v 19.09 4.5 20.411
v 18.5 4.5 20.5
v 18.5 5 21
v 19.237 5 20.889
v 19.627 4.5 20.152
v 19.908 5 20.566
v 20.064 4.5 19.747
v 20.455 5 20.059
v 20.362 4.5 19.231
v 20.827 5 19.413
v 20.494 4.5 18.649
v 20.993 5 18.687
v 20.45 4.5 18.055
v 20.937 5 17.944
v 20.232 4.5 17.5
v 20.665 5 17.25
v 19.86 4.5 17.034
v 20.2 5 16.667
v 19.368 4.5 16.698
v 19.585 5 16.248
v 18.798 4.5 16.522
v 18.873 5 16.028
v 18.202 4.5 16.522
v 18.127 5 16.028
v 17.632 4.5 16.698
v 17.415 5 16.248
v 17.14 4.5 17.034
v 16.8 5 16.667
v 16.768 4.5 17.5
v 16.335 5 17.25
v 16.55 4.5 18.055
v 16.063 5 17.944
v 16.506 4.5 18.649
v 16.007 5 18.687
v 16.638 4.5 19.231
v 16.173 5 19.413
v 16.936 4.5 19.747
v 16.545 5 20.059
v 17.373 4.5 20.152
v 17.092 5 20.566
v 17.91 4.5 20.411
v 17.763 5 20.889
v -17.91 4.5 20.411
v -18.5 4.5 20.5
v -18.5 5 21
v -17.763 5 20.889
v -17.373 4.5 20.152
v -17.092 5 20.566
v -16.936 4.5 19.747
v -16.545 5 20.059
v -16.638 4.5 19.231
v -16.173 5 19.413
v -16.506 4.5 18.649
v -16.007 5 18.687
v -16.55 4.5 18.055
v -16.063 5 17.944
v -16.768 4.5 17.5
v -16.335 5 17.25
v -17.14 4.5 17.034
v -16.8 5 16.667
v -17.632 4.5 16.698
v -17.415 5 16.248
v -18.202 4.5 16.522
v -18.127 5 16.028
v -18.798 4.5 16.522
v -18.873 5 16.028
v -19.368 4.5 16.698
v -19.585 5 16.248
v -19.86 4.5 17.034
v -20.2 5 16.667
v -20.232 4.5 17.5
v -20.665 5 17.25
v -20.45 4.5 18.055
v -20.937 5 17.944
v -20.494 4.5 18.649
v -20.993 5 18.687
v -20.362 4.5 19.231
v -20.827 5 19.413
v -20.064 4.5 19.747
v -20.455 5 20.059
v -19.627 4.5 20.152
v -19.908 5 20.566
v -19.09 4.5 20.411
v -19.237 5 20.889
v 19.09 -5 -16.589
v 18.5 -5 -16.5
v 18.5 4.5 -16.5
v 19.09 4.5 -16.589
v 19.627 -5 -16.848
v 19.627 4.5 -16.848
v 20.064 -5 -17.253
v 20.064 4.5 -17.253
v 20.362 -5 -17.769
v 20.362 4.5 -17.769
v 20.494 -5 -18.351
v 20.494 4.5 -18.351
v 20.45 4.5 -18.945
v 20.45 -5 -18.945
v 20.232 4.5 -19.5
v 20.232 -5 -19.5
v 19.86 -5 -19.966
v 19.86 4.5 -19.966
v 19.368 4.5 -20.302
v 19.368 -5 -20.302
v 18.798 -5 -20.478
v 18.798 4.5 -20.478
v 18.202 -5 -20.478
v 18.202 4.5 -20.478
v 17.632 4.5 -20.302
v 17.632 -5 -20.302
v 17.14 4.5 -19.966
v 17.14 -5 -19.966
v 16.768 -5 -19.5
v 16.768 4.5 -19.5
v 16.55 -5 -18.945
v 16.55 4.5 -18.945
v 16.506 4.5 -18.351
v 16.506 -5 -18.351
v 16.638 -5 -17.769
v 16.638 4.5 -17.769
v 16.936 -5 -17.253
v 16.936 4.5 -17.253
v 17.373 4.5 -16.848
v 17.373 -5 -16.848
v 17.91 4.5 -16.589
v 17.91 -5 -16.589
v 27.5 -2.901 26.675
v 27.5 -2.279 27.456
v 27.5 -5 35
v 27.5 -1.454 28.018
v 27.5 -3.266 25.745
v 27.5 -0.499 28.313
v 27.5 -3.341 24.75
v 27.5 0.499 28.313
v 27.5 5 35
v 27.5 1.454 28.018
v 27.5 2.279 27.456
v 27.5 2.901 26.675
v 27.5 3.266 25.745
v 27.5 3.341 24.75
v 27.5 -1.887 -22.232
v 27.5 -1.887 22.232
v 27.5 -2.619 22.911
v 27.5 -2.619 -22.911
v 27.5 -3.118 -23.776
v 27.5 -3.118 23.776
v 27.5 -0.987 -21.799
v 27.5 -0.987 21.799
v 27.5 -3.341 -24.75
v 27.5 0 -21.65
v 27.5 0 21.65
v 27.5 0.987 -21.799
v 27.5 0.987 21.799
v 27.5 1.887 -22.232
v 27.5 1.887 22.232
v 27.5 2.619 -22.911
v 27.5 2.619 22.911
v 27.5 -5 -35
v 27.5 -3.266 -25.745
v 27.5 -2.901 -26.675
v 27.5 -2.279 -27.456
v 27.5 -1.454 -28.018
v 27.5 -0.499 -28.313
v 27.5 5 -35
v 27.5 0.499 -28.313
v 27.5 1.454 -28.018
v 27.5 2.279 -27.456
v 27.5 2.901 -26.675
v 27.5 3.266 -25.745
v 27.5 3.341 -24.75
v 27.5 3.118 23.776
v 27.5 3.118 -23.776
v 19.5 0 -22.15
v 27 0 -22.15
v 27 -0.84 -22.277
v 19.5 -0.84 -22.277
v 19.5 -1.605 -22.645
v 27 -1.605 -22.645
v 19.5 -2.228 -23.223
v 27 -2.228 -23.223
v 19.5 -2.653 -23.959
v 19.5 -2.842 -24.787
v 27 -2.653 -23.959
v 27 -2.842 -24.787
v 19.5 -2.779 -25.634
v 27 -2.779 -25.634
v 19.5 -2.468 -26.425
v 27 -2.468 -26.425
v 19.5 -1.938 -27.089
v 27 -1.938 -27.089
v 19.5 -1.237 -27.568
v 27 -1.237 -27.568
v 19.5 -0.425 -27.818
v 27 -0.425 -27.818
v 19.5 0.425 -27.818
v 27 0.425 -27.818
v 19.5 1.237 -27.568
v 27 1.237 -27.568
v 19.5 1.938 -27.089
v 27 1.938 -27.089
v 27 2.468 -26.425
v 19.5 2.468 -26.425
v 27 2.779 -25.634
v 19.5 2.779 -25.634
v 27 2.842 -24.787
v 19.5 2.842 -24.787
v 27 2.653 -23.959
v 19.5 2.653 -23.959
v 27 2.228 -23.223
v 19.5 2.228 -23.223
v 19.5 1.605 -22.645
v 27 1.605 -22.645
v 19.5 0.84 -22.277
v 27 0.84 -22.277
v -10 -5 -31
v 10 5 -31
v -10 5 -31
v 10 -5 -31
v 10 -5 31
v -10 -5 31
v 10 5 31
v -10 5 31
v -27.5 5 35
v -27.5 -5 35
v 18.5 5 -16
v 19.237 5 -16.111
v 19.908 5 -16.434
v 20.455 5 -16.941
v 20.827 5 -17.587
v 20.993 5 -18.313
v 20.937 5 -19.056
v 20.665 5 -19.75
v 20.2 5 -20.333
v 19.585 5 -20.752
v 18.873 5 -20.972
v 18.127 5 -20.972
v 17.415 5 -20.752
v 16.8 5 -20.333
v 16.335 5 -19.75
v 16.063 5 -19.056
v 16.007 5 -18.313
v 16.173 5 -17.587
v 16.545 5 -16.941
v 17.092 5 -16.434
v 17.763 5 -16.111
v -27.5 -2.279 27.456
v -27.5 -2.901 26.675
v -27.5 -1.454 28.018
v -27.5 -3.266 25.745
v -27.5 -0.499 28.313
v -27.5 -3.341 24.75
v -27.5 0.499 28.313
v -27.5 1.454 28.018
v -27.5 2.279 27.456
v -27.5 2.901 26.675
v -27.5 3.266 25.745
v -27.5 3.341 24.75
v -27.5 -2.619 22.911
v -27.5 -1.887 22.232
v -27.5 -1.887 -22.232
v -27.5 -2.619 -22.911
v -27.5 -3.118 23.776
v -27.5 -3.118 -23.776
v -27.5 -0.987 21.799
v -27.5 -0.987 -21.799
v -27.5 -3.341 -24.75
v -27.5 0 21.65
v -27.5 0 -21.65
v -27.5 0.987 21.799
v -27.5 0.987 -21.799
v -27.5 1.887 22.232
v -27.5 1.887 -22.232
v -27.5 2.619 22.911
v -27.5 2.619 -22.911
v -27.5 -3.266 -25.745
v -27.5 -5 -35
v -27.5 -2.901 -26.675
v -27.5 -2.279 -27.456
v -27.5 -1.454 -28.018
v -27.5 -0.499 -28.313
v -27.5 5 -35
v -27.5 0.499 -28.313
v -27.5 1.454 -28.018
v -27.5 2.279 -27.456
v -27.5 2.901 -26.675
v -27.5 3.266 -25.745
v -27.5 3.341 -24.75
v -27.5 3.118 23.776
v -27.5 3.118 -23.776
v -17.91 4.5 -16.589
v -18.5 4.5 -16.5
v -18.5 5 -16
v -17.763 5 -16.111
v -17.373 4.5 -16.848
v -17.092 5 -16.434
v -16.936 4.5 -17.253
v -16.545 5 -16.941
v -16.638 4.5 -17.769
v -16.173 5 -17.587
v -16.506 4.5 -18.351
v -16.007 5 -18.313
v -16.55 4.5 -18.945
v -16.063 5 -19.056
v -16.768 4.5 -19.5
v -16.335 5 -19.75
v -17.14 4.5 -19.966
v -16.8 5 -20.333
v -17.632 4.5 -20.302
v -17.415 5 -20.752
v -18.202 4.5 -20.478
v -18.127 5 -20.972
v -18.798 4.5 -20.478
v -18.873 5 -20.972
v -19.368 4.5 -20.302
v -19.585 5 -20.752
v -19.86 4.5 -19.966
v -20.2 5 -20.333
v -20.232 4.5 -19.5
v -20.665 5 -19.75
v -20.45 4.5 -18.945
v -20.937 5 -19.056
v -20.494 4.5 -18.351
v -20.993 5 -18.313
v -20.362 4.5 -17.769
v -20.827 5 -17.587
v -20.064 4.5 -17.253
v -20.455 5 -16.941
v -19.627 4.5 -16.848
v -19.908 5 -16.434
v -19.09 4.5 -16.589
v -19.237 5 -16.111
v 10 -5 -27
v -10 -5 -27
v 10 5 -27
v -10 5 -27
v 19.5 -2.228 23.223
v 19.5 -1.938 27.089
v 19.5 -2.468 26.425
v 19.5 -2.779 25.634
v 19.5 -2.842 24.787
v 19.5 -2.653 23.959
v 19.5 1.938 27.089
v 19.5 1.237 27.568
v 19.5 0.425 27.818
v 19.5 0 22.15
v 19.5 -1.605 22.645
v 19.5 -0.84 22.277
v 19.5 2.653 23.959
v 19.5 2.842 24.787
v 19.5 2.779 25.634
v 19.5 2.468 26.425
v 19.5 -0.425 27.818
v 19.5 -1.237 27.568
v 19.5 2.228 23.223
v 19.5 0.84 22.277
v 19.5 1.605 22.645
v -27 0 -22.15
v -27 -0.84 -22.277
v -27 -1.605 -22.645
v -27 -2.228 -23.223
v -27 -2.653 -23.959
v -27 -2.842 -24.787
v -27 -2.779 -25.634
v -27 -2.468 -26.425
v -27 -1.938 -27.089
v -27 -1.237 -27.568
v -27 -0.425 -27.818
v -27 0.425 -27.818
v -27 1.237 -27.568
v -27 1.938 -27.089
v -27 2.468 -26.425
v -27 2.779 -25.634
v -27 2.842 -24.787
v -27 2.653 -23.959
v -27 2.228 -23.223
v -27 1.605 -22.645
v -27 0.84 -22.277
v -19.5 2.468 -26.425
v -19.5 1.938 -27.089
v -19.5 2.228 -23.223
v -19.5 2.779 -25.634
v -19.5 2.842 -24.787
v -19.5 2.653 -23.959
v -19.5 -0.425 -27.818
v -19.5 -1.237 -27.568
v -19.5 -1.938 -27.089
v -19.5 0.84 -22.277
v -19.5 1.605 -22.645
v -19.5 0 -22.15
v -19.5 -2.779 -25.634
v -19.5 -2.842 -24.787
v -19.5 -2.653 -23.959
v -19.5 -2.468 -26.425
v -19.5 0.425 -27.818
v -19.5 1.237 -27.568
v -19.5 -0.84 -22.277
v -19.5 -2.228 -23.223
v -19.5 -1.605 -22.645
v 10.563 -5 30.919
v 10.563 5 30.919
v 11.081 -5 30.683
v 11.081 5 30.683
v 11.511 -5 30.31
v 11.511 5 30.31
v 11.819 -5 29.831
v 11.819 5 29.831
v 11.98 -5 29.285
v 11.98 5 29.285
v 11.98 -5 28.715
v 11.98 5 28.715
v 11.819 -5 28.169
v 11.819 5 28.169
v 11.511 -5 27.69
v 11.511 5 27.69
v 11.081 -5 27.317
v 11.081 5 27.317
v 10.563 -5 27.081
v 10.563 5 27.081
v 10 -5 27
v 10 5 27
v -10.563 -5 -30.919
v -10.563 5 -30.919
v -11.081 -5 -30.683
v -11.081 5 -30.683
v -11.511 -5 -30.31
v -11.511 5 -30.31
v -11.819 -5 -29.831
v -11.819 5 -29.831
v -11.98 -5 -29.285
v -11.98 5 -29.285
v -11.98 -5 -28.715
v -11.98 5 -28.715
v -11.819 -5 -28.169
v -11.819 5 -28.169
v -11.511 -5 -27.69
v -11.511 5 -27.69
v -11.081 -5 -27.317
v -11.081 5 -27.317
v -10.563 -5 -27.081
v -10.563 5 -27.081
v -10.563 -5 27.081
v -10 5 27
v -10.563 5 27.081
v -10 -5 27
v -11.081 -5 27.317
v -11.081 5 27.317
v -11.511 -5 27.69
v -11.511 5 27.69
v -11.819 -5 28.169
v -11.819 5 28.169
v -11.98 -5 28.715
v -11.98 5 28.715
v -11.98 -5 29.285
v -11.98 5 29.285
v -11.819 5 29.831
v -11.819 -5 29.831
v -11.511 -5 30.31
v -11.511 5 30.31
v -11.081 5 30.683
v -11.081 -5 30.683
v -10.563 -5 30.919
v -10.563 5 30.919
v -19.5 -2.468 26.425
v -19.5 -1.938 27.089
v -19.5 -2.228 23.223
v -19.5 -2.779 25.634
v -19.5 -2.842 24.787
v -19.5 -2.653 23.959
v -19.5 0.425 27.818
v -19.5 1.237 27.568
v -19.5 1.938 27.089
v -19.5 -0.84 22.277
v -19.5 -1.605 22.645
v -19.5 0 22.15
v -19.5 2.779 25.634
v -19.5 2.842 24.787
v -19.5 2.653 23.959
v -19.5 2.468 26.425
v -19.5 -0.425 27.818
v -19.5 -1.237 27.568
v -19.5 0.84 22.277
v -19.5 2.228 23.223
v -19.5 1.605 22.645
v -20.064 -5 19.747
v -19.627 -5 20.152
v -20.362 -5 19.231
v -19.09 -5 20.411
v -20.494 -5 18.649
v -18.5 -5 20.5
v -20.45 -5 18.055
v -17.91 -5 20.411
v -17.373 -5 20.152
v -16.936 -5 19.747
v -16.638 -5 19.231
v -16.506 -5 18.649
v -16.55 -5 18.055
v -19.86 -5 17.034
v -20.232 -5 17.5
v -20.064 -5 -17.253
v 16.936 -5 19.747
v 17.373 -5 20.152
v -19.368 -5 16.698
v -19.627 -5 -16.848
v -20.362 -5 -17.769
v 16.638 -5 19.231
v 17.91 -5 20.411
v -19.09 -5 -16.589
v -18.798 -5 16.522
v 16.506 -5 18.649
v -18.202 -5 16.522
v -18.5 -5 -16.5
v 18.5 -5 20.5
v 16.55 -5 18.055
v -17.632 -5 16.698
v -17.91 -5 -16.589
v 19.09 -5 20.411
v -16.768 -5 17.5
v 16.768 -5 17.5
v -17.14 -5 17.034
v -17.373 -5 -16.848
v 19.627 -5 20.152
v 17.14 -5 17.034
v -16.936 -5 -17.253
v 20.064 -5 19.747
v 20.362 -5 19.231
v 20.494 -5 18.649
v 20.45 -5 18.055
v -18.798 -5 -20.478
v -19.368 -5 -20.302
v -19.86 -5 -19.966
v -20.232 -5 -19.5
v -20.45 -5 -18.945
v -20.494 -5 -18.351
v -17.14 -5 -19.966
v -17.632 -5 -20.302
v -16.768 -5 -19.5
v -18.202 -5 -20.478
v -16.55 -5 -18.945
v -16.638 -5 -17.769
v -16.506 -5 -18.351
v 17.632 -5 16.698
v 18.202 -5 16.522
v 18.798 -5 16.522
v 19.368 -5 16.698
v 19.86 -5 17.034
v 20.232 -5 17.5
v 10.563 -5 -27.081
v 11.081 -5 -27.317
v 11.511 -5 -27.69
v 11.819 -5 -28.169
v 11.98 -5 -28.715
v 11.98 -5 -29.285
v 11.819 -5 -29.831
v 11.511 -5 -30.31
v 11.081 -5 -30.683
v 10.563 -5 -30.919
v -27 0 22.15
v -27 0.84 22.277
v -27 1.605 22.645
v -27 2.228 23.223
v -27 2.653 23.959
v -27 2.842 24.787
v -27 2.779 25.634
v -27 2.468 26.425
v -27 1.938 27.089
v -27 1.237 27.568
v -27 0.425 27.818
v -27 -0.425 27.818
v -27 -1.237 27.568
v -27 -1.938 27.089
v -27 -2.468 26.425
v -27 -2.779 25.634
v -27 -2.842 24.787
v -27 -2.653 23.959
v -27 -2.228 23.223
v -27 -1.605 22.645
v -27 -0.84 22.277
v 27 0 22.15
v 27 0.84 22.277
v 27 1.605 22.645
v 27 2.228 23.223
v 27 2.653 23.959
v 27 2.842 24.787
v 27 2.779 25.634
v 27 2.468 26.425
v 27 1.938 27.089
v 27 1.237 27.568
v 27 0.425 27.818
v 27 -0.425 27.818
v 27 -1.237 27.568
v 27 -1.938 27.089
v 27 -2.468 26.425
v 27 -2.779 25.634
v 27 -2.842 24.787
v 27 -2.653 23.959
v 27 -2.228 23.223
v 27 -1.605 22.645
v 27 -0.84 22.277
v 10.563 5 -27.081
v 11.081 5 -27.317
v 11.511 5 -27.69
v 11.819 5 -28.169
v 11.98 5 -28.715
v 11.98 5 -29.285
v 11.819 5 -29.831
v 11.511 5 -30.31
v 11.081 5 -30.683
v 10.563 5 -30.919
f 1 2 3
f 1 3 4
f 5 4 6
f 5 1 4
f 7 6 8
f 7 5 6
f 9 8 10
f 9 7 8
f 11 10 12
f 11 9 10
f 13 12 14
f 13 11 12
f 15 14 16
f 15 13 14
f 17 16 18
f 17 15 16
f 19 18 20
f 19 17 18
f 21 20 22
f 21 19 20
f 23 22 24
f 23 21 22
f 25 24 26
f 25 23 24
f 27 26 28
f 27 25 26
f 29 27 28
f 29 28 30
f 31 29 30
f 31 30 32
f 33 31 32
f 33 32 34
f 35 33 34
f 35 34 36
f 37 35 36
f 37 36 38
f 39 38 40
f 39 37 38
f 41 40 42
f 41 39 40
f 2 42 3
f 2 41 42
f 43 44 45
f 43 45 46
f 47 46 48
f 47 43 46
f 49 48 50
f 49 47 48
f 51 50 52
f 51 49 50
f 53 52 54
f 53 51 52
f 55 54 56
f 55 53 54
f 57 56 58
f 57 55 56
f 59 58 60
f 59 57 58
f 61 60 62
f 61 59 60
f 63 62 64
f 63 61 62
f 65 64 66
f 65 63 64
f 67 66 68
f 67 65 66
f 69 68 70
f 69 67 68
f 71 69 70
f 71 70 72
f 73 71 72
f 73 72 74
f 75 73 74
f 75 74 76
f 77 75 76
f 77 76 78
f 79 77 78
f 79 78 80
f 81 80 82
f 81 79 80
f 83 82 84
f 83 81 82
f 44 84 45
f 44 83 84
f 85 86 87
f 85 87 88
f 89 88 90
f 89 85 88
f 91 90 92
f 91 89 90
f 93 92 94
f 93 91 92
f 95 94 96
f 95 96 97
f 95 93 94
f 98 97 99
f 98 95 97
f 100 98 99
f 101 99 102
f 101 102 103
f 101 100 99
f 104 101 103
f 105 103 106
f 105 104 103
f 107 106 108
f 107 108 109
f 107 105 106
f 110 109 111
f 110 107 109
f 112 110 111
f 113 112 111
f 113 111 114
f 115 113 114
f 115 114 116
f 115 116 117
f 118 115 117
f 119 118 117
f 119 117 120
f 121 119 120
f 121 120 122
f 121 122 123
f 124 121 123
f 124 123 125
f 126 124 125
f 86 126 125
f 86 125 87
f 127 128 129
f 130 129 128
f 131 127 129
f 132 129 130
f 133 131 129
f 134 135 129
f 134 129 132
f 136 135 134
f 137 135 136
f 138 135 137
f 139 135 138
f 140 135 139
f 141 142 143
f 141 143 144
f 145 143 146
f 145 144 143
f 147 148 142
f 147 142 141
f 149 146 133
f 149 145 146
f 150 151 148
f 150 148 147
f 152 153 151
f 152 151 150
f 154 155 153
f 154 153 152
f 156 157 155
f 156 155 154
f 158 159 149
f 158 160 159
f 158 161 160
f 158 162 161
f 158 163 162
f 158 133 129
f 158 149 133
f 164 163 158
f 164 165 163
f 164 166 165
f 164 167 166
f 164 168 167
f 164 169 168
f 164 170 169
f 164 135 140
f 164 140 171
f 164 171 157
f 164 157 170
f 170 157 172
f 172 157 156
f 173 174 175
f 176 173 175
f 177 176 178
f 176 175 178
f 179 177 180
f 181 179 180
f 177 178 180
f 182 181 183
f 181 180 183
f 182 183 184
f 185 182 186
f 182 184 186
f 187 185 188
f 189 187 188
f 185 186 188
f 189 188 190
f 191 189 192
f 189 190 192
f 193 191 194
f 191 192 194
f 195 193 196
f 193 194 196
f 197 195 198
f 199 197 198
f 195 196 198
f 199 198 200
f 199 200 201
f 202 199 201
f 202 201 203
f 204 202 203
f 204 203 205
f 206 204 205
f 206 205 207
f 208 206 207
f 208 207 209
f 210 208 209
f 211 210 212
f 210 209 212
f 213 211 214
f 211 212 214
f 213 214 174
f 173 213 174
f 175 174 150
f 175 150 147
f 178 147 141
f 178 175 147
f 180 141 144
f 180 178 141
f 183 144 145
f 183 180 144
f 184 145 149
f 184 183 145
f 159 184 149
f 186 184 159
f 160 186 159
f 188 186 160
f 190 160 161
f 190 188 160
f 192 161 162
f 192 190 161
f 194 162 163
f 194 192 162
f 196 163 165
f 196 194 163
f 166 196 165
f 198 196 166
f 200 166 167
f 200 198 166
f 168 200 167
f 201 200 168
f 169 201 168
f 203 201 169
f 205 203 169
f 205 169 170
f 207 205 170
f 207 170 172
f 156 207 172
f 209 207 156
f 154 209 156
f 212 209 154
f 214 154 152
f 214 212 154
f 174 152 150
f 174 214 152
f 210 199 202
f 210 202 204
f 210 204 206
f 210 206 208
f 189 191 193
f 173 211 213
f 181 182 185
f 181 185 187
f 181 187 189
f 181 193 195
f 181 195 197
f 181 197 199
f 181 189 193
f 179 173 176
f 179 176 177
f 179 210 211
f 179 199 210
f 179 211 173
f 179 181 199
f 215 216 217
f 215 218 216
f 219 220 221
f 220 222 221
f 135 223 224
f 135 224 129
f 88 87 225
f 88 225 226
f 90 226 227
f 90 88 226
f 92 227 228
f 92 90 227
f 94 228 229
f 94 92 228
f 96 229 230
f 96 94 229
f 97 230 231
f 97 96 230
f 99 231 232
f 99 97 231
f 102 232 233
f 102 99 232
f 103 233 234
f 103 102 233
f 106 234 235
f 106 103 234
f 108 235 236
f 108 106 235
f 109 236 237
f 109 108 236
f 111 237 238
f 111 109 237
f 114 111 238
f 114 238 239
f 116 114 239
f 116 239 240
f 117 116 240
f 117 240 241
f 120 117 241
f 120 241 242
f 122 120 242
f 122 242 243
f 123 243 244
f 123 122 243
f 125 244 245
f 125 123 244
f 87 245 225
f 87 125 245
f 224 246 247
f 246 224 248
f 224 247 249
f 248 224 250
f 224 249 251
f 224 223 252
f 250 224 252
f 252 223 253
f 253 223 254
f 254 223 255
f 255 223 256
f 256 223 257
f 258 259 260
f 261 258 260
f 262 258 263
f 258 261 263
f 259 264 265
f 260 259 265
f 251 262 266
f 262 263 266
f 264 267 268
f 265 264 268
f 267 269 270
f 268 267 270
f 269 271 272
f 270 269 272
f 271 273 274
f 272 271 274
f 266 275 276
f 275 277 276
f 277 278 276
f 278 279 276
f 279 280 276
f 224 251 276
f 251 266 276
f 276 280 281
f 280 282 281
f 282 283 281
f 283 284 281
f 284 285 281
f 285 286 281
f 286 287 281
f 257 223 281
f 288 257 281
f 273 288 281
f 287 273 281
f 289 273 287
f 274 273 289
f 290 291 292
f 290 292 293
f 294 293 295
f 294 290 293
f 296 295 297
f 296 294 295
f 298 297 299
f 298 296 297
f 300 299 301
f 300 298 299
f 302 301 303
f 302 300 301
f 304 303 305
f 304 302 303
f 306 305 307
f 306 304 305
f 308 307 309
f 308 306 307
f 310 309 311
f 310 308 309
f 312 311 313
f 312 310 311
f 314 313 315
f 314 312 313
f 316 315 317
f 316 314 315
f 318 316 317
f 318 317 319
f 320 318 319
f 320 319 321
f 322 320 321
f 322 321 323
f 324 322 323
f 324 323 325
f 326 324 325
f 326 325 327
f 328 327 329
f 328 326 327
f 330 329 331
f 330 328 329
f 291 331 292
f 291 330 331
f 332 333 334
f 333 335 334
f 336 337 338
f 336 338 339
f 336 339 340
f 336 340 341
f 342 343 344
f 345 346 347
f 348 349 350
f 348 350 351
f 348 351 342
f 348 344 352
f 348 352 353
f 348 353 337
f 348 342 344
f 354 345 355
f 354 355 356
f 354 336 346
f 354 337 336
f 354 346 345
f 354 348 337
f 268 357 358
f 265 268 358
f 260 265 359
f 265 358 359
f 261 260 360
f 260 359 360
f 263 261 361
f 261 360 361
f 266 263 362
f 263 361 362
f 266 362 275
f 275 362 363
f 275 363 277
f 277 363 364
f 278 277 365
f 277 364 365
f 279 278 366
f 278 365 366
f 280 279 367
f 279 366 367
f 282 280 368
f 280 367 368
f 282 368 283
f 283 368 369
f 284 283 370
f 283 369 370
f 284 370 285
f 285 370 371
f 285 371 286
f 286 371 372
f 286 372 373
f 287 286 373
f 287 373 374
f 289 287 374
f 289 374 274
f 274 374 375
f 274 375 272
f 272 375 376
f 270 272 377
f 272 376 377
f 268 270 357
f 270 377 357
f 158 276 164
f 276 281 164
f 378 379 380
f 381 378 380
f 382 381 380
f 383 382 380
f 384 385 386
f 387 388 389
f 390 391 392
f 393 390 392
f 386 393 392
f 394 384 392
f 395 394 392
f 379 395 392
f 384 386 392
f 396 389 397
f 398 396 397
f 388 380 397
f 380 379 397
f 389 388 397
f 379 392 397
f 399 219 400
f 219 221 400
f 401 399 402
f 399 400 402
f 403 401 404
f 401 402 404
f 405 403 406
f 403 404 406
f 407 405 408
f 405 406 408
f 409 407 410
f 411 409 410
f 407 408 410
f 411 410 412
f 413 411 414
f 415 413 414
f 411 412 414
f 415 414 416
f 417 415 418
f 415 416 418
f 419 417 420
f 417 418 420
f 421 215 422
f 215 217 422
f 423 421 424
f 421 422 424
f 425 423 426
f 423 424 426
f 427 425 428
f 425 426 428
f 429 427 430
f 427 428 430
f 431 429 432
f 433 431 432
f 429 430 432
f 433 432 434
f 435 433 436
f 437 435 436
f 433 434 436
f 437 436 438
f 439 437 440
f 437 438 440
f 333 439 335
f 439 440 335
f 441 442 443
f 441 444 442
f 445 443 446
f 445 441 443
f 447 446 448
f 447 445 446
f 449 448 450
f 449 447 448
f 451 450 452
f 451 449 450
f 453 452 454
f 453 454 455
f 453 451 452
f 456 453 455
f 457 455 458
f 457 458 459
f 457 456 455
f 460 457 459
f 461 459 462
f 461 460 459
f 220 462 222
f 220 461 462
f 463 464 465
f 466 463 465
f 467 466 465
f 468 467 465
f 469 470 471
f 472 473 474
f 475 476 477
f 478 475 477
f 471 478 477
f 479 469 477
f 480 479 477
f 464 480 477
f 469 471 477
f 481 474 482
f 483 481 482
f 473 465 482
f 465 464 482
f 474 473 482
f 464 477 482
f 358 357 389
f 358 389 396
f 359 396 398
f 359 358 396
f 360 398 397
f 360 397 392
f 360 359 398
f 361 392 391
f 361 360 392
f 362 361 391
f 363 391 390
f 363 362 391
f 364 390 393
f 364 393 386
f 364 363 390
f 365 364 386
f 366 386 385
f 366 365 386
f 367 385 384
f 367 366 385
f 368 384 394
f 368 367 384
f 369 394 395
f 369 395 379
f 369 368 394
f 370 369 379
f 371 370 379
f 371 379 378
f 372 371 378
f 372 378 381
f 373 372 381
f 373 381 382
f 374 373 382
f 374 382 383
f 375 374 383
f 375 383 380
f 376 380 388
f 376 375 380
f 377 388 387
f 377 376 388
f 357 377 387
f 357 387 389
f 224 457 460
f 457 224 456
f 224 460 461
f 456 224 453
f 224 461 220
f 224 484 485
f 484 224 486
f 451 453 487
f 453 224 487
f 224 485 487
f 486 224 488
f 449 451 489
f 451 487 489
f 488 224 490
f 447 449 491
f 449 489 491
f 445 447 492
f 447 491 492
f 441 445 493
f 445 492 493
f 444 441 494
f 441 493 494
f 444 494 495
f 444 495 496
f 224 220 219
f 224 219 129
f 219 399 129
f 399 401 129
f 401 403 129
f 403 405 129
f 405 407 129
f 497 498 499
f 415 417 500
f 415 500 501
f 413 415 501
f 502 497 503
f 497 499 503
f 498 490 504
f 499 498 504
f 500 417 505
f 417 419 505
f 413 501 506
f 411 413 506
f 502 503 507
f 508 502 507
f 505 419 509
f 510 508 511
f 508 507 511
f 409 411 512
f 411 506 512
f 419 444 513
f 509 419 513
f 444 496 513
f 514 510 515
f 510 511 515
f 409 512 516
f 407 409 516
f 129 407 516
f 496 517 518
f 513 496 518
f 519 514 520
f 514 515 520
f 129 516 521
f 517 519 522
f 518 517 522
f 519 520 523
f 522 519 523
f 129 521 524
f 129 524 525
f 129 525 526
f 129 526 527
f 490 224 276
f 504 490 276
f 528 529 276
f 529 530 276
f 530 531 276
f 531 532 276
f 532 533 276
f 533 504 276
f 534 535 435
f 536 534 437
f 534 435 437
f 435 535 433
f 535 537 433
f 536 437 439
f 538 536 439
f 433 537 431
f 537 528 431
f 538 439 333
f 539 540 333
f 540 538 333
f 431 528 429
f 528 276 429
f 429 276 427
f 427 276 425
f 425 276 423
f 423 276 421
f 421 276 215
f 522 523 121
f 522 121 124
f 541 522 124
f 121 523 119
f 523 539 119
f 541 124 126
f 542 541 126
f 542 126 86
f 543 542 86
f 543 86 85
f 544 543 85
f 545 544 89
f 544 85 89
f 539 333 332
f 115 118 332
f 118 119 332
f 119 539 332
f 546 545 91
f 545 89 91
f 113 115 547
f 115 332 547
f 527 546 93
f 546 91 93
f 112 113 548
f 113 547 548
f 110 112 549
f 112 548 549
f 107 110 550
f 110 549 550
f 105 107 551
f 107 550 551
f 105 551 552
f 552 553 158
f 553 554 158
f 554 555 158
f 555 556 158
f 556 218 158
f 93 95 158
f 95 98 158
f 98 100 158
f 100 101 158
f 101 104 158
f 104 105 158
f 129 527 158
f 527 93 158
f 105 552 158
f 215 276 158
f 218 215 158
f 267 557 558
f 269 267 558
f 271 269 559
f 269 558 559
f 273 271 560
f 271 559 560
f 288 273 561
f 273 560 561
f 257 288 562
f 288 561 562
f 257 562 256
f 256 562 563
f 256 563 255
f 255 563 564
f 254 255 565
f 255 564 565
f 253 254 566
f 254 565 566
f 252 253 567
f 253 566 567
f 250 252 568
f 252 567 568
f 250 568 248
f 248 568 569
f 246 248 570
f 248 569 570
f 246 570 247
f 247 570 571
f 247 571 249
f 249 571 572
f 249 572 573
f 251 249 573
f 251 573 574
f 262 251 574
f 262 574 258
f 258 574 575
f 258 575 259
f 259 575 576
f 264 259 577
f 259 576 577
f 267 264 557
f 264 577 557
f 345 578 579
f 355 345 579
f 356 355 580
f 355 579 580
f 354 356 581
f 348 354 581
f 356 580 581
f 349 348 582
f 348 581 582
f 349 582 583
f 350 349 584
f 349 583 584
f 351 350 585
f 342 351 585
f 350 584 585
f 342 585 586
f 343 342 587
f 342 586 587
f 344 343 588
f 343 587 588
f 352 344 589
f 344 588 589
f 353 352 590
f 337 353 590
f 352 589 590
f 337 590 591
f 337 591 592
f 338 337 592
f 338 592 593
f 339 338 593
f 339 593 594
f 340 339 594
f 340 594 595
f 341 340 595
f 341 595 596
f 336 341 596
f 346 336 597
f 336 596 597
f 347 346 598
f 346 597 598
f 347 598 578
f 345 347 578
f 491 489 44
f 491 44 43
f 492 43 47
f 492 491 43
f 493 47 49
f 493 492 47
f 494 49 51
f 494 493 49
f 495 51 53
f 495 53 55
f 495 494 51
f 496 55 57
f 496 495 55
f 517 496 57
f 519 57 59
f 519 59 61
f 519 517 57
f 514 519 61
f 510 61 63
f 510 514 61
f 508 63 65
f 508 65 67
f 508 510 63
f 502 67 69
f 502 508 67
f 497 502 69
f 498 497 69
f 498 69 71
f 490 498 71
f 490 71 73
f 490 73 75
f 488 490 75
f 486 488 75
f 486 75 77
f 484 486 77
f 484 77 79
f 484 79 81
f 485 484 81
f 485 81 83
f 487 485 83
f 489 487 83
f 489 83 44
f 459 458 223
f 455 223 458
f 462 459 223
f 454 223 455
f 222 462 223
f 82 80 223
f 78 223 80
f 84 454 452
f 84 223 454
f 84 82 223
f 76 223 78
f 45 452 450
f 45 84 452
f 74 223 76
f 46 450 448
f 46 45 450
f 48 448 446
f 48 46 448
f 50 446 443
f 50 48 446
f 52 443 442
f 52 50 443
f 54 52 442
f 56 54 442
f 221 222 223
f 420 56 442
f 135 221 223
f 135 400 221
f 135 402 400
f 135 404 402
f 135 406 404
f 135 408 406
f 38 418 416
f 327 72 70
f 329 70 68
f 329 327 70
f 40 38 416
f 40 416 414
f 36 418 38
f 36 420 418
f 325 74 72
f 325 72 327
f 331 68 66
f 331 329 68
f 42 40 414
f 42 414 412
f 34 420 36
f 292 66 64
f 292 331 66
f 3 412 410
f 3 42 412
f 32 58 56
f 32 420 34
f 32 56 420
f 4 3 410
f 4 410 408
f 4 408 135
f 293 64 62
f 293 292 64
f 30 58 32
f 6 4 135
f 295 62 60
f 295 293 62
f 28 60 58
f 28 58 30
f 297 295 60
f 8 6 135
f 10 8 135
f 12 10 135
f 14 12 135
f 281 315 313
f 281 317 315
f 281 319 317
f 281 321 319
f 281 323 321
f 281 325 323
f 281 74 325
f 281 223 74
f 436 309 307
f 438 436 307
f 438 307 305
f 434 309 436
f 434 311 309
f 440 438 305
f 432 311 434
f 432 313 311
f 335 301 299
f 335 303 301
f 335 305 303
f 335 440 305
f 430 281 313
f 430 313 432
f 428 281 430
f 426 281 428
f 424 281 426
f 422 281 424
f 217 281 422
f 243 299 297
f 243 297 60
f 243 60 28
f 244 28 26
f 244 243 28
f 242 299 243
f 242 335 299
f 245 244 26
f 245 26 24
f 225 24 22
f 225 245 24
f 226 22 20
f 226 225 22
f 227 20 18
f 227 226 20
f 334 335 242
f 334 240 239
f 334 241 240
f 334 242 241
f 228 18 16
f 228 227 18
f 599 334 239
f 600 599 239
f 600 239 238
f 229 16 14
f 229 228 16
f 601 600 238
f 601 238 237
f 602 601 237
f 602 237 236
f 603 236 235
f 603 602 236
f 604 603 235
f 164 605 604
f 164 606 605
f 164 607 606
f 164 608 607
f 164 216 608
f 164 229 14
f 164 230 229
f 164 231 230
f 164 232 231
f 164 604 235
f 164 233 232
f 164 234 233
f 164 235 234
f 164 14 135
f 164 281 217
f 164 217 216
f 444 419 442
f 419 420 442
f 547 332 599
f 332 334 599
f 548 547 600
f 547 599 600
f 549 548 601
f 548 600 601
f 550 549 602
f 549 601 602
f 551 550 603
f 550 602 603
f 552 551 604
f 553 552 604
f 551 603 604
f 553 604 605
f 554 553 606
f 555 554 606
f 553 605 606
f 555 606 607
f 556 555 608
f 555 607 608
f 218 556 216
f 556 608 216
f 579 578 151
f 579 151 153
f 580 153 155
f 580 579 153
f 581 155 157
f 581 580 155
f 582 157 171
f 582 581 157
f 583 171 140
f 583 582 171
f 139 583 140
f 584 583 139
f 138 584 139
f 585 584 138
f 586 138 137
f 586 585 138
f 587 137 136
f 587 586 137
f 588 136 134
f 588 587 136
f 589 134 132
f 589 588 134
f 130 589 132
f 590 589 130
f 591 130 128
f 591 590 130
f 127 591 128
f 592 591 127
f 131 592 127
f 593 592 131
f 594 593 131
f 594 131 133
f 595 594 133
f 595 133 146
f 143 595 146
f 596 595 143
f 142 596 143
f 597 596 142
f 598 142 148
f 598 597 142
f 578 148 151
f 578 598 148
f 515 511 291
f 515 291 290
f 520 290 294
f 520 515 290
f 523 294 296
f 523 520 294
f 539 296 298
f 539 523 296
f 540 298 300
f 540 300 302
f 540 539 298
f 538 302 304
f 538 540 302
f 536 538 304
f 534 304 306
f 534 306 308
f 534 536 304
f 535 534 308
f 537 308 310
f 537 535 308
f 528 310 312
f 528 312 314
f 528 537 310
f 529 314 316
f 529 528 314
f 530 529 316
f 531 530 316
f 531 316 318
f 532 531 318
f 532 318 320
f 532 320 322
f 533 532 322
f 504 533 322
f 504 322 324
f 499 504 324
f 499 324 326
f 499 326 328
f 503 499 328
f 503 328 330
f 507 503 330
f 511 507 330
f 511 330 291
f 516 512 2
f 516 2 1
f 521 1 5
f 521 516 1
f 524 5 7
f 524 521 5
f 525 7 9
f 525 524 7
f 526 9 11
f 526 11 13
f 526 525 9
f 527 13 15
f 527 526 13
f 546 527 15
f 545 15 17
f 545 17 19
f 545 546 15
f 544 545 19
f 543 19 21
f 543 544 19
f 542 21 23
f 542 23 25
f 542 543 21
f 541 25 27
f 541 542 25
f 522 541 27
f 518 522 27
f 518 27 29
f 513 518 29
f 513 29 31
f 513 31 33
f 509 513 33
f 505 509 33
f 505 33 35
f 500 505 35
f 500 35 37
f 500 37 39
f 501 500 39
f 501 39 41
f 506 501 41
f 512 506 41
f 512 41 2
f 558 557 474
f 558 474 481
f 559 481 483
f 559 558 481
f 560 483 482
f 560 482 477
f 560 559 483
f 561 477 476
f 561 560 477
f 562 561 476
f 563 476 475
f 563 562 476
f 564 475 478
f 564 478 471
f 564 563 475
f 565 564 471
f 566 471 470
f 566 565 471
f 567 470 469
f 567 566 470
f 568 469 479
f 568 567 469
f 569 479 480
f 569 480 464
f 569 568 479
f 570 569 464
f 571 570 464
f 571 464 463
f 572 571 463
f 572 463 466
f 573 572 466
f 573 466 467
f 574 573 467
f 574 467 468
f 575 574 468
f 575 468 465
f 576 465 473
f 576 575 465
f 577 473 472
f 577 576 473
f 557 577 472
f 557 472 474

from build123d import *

# Parameters (mm, degrees)
SKETCH1_W           = 55
SKETCH1_H           = 70
SKETCH1_R           = 2
BOSS_EXTRUDE1_DEPTH = 5
SKETCH2_R           = 2.85
CUT_EXTRUDE1_DEPTH  = 8
CHAMFER1_SIZE       = 0.5


with BuildPart() as part:
    # Sketch1 → Boss-Extrude1 (new, symmetric)
    with BuildSketch(Plane(origin=(0, 0, 0), x_dir=(1, 0, 0), z_dir=(0, 1, 0))):
        Rectangle(SKETCH1_W, SKETCH1_H)
        with Locations(Location((18.5, -18.5, 0), (0, 0, 270))):
            Circle(SKETCH1_R, mode=Mode.SUBTRACT)
        with Locations(Location((-18.5, -18.5, 0), (0, 0, 270))):
            Circle(SKETCH1_R, mode=Mode.SUBTRACT)
        with Locations(Location((18.5, 18.5, 0), (0, 0, 270))):
            Circle(SKETCH1_R, mode=Mode.SUBTRACT)
        with Locations(Location((-18.5, 18.5, 0), (0, 0, 270))):
            Circle(SKETCH1_R, mode=Mode.SUBTRACT)
        with BuildLine():
            Line((-10, 27), (10, 27))
            ThreePointArc((10, 27), (12, 29), (10, 31))
            Line((10, 31), (-10, 31))
            ThreePointArc((-10, 31), (-12, 29), (-10, 27))
        make_face(mode=Mode.SUBTRACT)
        with BuildLine():
            Line((-10, -31), (10, -31))
            ThreePointArc((10, -31), (12, -29), (10, -27))
            Line((10, -27), (-10, -27))
            ThreePointArc((-10, -27), (-12, -29), (-10, -31))
        make_face(mode=Mode.SUBTRACT)
    extrude(amount=BOSS_EXTRUDE1_DEPTH, both=True)

    # Sketch2 → Cut-Extrude1 (cut)
    with BuildSketch(Plane(origin=(27.5, 0, 0), x_dir=(0, 0, -1), z_dir=(1, 0, 0))):
        with Locations((-25, 0)):
            Circle(SKETCH2_R)
        with Locations(Location((25, 0, 0), (0, 0, 180))):
            Circle(SKETCH2_R)
    cut_extrude1 = extrude(amount=-CUT_EXTRUDE1_DEPTH, mode=Mode.SUBTRACT)

    # Mirror1: Cut-Extrude1 across plane
    add(cut_extrude1.mirror(Plane(origin=(0, 0, 0), x_dir=(0, 0, 1), z_dir=(1, 0, 0))), mode=Mode.SUBTRACT)

    # Chamfer1
    chamfer1_edges = [part.edges().sort_by_distance(p)[0] for p in [
        (-18.5, 5, 16.5),
        (18.5, 5, -20.5),
        (18.5, 5, 16.5),
        (-18.5, 5, -20.5),
        (27.5, 0, 27.85),
        (27.5, 0, -27.85),
        (-27.5, 0, 27.85),
        (-27.5, 0, -27.85),
    ]]
    chamfer(chamfer1_edges, length=CHAMFER1_SIZE)


solid = part.part
